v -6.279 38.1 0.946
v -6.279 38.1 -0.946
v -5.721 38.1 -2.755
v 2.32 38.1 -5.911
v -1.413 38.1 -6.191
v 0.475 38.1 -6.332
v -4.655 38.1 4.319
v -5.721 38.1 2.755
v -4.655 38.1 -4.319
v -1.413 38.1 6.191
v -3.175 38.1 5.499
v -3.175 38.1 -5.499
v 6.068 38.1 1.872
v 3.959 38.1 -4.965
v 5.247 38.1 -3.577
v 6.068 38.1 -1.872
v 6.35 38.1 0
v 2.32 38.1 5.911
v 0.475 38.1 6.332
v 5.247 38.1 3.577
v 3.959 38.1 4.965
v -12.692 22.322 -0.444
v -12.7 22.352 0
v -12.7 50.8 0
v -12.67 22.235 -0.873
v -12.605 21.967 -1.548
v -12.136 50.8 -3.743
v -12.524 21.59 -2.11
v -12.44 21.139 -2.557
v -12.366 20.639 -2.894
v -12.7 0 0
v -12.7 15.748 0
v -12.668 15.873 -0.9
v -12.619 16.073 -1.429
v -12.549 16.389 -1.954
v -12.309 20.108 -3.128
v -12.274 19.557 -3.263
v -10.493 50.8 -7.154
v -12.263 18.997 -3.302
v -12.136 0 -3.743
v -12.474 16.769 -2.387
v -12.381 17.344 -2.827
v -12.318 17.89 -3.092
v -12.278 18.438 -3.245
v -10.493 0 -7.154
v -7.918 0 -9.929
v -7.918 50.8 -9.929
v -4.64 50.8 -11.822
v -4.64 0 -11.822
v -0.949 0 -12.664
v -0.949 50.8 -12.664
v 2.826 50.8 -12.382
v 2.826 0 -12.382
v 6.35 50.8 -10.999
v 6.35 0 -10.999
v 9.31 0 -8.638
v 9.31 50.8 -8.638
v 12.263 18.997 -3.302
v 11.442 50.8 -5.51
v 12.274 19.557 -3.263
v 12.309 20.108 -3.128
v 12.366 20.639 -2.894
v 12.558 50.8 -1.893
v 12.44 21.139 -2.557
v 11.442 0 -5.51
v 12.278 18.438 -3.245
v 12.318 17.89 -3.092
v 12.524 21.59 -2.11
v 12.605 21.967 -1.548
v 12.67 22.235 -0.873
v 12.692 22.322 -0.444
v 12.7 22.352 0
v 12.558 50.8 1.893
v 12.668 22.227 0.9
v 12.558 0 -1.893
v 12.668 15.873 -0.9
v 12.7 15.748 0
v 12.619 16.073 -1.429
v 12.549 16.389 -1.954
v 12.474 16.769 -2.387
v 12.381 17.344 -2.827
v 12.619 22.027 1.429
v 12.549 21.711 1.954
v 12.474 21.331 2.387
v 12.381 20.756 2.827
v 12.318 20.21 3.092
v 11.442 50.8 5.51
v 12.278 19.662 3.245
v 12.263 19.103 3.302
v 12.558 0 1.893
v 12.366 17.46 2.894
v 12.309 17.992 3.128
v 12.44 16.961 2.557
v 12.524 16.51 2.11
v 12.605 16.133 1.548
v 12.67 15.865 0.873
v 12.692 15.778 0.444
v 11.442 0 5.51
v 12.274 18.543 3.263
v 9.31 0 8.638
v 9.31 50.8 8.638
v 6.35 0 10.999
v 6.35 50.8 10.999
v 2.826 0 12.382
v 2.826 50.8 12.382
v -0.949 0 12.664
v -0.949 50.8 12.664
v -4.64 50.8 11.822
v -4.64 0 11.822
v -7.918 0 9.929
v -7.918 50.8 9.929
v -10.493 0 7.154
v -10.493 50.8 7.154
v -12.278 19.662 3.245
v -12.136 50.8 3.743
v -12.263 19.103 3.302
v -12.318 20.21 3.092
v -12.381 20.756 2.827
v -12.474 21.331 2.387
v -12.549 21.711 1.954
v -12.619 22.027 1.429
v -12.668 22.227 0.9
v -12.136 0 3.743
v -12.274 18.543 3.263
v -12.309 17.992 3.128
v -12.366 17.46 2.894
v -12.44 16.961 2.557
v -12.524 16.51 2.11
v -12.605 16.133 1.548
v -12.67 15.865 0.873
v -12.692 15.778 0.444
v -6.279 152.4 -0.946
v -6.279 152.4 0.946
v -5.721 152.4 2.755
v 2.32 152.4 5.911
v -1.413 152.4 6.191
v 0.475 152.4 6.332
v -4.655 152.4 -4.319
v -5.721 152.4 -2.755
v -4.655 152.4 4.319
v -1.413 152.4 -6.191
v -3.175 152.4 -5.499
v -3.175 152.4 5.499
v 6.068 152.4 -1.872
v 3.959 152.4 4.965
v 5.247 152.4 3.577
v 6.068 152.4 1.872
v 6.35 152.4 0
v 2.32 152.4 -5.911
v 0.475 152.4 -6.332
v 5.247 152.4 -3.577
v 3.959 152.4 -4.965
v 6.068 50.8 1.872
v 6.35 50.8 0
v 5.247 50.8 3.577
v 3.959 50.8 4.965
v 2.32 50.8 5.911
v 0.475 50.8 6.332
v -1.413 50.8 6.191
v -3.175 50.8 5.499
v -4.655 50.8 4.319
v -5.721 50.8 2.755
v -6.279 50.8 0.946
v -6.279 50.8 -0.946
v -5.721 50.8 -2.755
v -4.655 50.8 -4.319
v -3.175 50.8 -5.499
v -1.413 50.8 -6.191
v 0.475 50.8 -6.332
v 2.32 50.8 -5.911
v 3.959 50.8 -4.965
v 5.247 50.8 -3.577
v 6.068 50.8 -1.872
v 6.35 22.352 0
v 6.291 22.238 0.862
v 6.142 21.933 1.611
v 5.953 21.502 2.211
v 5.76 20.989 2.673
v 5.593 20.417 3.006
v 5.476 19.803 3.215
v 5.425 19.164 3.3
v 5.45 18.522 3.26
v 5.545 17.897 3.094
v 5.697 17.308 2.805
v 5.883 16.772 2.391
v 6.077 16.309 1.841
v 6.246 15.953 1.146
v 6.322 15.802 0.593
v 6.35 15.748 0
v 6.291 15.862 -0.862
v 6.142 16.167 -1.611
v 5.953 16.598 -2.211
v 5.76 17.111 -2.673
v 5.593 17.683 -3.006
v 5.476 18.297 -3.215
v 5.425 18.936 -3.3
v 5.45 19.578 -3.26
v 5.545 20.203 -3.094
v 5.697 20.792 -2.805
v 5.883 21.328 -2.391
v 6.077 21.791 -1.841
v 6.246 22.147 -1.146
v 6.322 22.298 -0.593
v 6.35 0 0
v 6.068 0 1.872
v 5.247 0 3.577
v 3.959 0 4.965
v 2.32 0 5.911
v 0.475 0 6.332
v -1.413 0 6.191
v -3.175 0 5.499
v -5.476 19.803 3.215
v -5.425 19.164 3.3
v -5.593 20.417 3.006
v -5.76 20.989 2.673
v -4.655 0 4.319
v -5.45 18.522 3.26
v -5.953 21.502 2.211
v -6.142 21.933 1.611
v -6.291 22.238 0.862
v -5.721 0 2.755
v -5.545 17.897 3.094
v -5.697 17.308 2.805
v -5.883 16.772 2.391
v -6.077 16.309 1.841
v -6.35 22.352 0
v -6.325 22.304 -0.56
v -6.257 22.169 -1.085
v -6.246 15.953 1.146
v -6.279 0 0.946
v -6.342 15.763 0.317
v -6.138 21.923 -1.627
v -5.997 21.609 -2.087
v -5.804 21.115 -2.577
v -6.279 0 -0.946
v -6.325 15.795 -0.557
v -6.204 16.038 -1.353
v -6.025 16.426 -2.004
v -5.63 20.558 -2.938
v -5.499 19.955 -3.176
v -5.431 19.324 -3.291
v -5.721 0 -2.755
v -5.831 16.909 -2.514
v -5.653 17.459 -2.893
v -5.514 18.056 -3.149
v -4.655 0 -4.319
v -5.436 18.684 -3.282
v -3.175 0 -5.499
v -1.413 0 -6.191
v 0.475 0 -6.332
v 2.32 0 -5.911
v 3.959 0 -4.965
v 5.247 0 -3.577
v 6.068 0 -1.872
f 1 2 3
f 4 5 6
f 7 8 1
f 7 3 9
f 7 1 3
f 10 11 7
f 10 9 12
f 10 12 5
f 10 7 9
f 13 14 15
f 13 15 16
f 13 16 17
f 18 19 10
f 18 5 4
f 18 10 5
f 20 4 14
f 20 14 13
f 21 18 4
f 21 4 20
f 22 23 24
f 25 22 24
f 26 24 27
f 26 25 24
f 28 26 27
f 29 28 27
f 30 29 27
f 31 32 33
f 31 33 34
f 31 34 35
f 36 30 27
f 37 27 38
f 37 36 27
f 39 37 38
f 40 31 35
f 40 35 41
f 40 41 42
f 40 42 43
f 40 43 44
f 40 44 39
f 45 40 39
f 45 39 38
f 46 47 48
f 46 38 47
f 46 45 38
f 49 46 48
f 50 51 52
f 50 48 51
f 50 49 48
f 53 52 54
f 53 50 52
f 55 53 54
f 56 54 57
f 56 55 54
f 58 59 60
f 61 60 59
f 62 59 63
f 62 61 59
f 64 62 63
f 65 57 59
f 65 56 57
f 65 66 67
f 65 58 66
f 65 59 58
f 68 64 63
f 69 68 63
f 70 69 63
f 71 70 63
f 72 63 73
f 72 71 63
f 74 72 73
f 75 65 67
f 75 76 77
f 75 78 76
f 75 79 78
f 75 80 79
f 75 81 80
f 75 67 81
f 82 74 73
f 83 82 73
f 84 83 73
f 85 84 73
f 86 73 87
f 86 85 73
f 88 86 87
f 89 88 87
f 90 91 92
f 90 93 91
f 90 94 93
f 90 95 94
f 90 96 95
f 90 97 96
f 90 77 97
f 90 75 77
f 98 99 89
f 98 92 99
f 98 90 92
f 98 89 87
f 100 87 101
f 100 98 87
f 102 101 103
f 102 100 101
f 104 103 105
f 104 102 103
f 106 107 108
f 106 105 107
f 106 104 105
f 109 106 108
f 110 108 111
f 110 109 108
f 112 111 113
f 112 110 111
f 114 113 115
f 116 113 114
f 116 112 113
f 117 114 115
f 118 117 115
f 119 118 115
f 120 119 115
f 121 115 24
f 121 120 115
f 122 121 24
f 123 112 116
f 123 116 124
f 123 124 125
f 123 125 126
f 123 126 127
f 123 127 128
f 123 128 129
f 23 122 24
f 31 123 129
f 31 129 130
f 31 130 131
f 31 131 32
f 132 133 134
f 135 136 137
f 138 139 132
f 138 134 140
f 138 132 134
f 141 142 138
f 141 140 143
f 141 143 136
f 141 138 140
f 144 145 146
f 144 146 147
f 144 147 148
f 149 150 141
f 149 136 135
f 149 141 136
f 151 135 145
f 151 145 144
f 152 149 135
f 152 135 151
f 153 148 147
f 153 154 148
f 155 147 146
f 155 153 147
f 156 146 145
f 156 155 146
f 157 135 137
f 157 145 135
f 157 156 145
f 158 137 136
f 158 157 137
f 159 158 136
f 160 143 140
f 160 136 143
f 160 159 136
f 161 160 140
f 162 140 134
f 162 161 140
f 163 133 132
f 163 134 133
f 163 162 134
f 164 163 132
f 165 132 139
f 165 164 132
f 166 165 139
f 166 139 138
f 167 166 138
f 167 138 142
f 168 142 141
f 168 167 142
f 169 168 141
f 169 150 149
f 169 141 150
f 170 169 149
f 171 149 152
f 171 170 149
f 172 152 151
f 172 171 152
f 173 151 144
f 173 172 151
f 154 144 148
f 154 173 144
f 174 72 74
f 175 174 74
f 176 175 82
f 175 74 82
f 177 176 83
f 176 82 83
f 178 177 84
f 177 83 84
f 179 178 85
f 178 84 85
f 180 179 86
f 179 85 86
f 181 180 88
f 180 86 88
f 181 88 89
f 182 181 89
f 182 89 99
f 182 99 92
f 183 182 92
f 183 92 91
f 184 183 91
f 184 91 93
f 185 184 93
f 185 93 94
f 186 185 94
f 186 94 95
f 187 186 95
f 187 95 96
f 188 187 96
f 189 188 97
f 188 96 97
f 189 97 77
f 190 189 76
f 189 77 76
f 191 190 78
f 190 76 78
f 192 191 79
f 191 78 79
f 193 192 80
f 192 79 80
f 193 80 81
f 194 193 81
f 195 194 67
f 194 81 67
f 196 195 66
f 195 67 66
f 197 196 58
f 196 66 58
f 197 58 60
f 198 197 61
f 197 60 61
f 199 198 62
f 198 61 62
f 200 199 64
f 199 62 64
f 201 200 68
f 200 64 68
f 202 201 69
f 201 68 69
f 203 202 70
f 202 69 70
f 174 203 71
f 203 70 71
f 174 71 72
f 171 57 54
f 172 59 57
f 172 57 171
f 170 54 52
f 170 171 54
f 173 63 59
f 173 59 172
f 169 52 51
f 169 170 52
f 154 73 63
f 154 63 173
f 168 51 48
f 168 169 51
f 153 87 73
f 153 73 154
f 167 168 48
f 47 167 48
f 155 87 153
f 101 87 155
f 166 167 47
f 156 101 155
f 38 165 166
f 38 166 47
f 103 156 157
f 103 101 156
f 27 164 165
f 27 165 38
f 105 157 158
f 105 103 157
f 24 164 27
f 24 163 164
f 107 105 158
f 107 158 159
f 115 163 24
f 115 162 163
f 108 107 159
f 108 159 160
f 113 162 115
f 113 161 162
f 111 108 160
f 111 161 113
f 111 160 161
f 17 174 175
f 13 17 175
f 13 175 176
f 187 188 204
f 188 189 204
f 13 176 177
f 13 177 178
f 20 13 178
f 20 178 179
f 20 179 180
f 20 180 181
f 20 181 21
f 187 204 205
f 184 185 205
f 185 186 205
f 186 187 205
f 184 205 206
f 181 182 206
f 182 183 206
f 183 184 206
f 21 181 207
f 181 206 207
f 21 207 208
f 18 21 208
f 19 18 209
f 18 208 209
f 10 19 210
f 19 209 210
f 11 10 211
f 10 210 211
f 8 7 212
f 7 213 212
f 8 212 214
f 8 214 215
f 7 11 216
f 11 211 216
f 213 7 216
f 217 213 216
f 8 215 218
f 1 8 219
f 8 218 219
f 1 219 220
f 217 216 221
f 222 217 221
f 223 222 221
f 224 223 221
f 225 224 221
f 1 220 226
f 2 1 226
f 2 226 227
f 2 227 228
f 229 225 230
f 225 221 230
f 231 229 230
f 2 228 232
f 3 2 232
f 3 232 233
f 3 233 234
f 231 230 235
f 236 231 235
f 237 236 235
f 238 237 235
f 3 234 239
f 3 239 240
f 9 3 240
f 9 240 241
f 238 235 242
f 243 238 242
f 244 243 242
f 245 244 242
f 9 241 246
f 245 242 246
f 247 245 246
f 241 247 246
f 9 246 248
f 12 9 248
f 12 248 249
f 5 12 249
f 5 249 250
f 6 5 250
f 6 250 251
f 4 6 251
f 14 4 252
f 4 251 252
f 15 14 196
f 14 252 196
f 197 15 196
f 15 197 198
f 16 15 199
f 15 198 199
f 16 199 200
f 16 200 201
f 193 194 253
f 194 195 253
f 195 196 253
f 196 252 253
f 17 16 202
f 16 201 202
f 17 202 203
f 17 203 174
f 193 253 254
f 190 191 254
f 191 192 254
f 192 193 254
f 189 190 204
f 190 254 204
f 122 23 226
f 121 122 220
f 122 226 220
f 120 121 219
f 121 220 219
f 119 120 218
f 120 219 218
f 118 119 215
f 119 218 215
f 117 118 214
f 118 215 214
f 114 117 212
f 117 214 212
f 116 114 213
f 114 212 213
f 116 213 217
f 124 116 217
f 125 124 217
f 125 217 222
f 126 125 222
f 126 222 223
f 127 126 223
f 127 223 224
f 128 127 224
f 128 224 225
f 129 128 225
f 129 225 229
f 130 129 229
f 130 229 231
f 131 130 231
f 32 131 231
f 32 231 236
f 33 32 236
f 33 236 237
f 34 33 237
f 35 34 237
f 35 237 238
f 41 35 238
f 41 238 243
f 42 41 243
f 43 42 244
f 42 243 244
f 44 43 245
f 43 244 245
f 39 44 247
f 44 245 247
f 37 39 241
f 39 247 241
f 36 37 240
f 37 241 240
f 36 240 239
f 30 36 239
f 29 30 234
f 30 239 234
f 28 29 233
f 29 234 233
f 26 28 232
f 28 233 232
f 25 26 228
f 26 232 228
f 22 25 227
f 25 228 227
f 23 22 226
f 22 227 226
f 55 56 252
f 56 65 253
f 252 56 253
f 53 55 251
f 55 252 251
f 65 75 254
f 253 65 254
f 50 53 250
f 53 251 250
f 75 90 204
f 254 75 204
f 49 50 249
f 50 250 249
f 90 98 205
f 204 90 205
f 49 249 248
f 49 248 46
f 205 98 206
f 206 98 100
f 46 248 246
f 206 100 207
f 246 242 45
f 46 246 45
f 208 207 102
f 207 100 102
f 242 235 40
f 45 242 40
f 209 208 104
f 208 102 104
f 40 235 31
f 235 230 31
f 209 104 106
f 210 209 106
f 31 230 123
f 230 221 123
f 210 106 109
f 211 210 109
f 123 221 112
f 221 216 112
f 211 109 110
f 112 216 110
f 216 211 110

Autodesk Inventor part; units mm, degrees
ref_plane "XZ Plane" through (0, 0, 0) normal (0, 1, 0) x (-1, 0, 0)
ref_plane "XY Plane" through (0, 0, 0) normal (0, 0, 1) x (1, 0, 0)
sketch "Sketch1" plane through (0, 0, 0) normal (0, 1, 0) x (-1, 0, 0)
  circle A0 centre (0, 0) radius 12.7
  dimension "d0" = 25.4
extrude "Extrusion1" add sketch "Sketch1" along normal blind 50.8
sketch "Sketch2" plane through (0, 50.8, 0) normal (0, 1, 0) x (1, 0, 0)
  circle A0 centre (0, 0) radius 6.35
  dimension "d3" = 12.7
extrude "Extrusion2" add sketch "Sketch2" along normal blind 101.6
sketch "Sketch3" plane through (0, 0, 0) normal (0, -1, 0) x (1, 0, 0)
  circle A0 centre (0, 0) radius 6.35
  dimension "d6" = 12.7
extrude "Extrusion3" cut sketch "Sketch3" against normal blind 38.1
ref_plane "Work Plane1" through (12.7, 0, 0) normal (1, 0, 0) x (0, 1, 0)
sketch "Sketch4" plane through (12.7, 0, 0) normal (1, 0, 0) x (0, 1, 0)
  line L0 (0, 0) -> (50.8, 0) construction
  line L1 (50.8, -12.7) -> (50.8, 12.7) construction
  line L2 (19.05, 12.7) -> (19.05, -12.7) construction
  line L3 (0, -12.7) -> (50.8, -12.7) construction
  line L4 (0, 12.7) -> (0, -12.7) construction
  circle A0 centre (19.05, 0) radius 3.302
  dimension "d10" = 19.05
  dimension "d11" = 6.604
extrude "Extrusion4" cut sketch "Sketch4" against normal through all
properties part number "Part of Clutch" material "Aluminum 6061"
